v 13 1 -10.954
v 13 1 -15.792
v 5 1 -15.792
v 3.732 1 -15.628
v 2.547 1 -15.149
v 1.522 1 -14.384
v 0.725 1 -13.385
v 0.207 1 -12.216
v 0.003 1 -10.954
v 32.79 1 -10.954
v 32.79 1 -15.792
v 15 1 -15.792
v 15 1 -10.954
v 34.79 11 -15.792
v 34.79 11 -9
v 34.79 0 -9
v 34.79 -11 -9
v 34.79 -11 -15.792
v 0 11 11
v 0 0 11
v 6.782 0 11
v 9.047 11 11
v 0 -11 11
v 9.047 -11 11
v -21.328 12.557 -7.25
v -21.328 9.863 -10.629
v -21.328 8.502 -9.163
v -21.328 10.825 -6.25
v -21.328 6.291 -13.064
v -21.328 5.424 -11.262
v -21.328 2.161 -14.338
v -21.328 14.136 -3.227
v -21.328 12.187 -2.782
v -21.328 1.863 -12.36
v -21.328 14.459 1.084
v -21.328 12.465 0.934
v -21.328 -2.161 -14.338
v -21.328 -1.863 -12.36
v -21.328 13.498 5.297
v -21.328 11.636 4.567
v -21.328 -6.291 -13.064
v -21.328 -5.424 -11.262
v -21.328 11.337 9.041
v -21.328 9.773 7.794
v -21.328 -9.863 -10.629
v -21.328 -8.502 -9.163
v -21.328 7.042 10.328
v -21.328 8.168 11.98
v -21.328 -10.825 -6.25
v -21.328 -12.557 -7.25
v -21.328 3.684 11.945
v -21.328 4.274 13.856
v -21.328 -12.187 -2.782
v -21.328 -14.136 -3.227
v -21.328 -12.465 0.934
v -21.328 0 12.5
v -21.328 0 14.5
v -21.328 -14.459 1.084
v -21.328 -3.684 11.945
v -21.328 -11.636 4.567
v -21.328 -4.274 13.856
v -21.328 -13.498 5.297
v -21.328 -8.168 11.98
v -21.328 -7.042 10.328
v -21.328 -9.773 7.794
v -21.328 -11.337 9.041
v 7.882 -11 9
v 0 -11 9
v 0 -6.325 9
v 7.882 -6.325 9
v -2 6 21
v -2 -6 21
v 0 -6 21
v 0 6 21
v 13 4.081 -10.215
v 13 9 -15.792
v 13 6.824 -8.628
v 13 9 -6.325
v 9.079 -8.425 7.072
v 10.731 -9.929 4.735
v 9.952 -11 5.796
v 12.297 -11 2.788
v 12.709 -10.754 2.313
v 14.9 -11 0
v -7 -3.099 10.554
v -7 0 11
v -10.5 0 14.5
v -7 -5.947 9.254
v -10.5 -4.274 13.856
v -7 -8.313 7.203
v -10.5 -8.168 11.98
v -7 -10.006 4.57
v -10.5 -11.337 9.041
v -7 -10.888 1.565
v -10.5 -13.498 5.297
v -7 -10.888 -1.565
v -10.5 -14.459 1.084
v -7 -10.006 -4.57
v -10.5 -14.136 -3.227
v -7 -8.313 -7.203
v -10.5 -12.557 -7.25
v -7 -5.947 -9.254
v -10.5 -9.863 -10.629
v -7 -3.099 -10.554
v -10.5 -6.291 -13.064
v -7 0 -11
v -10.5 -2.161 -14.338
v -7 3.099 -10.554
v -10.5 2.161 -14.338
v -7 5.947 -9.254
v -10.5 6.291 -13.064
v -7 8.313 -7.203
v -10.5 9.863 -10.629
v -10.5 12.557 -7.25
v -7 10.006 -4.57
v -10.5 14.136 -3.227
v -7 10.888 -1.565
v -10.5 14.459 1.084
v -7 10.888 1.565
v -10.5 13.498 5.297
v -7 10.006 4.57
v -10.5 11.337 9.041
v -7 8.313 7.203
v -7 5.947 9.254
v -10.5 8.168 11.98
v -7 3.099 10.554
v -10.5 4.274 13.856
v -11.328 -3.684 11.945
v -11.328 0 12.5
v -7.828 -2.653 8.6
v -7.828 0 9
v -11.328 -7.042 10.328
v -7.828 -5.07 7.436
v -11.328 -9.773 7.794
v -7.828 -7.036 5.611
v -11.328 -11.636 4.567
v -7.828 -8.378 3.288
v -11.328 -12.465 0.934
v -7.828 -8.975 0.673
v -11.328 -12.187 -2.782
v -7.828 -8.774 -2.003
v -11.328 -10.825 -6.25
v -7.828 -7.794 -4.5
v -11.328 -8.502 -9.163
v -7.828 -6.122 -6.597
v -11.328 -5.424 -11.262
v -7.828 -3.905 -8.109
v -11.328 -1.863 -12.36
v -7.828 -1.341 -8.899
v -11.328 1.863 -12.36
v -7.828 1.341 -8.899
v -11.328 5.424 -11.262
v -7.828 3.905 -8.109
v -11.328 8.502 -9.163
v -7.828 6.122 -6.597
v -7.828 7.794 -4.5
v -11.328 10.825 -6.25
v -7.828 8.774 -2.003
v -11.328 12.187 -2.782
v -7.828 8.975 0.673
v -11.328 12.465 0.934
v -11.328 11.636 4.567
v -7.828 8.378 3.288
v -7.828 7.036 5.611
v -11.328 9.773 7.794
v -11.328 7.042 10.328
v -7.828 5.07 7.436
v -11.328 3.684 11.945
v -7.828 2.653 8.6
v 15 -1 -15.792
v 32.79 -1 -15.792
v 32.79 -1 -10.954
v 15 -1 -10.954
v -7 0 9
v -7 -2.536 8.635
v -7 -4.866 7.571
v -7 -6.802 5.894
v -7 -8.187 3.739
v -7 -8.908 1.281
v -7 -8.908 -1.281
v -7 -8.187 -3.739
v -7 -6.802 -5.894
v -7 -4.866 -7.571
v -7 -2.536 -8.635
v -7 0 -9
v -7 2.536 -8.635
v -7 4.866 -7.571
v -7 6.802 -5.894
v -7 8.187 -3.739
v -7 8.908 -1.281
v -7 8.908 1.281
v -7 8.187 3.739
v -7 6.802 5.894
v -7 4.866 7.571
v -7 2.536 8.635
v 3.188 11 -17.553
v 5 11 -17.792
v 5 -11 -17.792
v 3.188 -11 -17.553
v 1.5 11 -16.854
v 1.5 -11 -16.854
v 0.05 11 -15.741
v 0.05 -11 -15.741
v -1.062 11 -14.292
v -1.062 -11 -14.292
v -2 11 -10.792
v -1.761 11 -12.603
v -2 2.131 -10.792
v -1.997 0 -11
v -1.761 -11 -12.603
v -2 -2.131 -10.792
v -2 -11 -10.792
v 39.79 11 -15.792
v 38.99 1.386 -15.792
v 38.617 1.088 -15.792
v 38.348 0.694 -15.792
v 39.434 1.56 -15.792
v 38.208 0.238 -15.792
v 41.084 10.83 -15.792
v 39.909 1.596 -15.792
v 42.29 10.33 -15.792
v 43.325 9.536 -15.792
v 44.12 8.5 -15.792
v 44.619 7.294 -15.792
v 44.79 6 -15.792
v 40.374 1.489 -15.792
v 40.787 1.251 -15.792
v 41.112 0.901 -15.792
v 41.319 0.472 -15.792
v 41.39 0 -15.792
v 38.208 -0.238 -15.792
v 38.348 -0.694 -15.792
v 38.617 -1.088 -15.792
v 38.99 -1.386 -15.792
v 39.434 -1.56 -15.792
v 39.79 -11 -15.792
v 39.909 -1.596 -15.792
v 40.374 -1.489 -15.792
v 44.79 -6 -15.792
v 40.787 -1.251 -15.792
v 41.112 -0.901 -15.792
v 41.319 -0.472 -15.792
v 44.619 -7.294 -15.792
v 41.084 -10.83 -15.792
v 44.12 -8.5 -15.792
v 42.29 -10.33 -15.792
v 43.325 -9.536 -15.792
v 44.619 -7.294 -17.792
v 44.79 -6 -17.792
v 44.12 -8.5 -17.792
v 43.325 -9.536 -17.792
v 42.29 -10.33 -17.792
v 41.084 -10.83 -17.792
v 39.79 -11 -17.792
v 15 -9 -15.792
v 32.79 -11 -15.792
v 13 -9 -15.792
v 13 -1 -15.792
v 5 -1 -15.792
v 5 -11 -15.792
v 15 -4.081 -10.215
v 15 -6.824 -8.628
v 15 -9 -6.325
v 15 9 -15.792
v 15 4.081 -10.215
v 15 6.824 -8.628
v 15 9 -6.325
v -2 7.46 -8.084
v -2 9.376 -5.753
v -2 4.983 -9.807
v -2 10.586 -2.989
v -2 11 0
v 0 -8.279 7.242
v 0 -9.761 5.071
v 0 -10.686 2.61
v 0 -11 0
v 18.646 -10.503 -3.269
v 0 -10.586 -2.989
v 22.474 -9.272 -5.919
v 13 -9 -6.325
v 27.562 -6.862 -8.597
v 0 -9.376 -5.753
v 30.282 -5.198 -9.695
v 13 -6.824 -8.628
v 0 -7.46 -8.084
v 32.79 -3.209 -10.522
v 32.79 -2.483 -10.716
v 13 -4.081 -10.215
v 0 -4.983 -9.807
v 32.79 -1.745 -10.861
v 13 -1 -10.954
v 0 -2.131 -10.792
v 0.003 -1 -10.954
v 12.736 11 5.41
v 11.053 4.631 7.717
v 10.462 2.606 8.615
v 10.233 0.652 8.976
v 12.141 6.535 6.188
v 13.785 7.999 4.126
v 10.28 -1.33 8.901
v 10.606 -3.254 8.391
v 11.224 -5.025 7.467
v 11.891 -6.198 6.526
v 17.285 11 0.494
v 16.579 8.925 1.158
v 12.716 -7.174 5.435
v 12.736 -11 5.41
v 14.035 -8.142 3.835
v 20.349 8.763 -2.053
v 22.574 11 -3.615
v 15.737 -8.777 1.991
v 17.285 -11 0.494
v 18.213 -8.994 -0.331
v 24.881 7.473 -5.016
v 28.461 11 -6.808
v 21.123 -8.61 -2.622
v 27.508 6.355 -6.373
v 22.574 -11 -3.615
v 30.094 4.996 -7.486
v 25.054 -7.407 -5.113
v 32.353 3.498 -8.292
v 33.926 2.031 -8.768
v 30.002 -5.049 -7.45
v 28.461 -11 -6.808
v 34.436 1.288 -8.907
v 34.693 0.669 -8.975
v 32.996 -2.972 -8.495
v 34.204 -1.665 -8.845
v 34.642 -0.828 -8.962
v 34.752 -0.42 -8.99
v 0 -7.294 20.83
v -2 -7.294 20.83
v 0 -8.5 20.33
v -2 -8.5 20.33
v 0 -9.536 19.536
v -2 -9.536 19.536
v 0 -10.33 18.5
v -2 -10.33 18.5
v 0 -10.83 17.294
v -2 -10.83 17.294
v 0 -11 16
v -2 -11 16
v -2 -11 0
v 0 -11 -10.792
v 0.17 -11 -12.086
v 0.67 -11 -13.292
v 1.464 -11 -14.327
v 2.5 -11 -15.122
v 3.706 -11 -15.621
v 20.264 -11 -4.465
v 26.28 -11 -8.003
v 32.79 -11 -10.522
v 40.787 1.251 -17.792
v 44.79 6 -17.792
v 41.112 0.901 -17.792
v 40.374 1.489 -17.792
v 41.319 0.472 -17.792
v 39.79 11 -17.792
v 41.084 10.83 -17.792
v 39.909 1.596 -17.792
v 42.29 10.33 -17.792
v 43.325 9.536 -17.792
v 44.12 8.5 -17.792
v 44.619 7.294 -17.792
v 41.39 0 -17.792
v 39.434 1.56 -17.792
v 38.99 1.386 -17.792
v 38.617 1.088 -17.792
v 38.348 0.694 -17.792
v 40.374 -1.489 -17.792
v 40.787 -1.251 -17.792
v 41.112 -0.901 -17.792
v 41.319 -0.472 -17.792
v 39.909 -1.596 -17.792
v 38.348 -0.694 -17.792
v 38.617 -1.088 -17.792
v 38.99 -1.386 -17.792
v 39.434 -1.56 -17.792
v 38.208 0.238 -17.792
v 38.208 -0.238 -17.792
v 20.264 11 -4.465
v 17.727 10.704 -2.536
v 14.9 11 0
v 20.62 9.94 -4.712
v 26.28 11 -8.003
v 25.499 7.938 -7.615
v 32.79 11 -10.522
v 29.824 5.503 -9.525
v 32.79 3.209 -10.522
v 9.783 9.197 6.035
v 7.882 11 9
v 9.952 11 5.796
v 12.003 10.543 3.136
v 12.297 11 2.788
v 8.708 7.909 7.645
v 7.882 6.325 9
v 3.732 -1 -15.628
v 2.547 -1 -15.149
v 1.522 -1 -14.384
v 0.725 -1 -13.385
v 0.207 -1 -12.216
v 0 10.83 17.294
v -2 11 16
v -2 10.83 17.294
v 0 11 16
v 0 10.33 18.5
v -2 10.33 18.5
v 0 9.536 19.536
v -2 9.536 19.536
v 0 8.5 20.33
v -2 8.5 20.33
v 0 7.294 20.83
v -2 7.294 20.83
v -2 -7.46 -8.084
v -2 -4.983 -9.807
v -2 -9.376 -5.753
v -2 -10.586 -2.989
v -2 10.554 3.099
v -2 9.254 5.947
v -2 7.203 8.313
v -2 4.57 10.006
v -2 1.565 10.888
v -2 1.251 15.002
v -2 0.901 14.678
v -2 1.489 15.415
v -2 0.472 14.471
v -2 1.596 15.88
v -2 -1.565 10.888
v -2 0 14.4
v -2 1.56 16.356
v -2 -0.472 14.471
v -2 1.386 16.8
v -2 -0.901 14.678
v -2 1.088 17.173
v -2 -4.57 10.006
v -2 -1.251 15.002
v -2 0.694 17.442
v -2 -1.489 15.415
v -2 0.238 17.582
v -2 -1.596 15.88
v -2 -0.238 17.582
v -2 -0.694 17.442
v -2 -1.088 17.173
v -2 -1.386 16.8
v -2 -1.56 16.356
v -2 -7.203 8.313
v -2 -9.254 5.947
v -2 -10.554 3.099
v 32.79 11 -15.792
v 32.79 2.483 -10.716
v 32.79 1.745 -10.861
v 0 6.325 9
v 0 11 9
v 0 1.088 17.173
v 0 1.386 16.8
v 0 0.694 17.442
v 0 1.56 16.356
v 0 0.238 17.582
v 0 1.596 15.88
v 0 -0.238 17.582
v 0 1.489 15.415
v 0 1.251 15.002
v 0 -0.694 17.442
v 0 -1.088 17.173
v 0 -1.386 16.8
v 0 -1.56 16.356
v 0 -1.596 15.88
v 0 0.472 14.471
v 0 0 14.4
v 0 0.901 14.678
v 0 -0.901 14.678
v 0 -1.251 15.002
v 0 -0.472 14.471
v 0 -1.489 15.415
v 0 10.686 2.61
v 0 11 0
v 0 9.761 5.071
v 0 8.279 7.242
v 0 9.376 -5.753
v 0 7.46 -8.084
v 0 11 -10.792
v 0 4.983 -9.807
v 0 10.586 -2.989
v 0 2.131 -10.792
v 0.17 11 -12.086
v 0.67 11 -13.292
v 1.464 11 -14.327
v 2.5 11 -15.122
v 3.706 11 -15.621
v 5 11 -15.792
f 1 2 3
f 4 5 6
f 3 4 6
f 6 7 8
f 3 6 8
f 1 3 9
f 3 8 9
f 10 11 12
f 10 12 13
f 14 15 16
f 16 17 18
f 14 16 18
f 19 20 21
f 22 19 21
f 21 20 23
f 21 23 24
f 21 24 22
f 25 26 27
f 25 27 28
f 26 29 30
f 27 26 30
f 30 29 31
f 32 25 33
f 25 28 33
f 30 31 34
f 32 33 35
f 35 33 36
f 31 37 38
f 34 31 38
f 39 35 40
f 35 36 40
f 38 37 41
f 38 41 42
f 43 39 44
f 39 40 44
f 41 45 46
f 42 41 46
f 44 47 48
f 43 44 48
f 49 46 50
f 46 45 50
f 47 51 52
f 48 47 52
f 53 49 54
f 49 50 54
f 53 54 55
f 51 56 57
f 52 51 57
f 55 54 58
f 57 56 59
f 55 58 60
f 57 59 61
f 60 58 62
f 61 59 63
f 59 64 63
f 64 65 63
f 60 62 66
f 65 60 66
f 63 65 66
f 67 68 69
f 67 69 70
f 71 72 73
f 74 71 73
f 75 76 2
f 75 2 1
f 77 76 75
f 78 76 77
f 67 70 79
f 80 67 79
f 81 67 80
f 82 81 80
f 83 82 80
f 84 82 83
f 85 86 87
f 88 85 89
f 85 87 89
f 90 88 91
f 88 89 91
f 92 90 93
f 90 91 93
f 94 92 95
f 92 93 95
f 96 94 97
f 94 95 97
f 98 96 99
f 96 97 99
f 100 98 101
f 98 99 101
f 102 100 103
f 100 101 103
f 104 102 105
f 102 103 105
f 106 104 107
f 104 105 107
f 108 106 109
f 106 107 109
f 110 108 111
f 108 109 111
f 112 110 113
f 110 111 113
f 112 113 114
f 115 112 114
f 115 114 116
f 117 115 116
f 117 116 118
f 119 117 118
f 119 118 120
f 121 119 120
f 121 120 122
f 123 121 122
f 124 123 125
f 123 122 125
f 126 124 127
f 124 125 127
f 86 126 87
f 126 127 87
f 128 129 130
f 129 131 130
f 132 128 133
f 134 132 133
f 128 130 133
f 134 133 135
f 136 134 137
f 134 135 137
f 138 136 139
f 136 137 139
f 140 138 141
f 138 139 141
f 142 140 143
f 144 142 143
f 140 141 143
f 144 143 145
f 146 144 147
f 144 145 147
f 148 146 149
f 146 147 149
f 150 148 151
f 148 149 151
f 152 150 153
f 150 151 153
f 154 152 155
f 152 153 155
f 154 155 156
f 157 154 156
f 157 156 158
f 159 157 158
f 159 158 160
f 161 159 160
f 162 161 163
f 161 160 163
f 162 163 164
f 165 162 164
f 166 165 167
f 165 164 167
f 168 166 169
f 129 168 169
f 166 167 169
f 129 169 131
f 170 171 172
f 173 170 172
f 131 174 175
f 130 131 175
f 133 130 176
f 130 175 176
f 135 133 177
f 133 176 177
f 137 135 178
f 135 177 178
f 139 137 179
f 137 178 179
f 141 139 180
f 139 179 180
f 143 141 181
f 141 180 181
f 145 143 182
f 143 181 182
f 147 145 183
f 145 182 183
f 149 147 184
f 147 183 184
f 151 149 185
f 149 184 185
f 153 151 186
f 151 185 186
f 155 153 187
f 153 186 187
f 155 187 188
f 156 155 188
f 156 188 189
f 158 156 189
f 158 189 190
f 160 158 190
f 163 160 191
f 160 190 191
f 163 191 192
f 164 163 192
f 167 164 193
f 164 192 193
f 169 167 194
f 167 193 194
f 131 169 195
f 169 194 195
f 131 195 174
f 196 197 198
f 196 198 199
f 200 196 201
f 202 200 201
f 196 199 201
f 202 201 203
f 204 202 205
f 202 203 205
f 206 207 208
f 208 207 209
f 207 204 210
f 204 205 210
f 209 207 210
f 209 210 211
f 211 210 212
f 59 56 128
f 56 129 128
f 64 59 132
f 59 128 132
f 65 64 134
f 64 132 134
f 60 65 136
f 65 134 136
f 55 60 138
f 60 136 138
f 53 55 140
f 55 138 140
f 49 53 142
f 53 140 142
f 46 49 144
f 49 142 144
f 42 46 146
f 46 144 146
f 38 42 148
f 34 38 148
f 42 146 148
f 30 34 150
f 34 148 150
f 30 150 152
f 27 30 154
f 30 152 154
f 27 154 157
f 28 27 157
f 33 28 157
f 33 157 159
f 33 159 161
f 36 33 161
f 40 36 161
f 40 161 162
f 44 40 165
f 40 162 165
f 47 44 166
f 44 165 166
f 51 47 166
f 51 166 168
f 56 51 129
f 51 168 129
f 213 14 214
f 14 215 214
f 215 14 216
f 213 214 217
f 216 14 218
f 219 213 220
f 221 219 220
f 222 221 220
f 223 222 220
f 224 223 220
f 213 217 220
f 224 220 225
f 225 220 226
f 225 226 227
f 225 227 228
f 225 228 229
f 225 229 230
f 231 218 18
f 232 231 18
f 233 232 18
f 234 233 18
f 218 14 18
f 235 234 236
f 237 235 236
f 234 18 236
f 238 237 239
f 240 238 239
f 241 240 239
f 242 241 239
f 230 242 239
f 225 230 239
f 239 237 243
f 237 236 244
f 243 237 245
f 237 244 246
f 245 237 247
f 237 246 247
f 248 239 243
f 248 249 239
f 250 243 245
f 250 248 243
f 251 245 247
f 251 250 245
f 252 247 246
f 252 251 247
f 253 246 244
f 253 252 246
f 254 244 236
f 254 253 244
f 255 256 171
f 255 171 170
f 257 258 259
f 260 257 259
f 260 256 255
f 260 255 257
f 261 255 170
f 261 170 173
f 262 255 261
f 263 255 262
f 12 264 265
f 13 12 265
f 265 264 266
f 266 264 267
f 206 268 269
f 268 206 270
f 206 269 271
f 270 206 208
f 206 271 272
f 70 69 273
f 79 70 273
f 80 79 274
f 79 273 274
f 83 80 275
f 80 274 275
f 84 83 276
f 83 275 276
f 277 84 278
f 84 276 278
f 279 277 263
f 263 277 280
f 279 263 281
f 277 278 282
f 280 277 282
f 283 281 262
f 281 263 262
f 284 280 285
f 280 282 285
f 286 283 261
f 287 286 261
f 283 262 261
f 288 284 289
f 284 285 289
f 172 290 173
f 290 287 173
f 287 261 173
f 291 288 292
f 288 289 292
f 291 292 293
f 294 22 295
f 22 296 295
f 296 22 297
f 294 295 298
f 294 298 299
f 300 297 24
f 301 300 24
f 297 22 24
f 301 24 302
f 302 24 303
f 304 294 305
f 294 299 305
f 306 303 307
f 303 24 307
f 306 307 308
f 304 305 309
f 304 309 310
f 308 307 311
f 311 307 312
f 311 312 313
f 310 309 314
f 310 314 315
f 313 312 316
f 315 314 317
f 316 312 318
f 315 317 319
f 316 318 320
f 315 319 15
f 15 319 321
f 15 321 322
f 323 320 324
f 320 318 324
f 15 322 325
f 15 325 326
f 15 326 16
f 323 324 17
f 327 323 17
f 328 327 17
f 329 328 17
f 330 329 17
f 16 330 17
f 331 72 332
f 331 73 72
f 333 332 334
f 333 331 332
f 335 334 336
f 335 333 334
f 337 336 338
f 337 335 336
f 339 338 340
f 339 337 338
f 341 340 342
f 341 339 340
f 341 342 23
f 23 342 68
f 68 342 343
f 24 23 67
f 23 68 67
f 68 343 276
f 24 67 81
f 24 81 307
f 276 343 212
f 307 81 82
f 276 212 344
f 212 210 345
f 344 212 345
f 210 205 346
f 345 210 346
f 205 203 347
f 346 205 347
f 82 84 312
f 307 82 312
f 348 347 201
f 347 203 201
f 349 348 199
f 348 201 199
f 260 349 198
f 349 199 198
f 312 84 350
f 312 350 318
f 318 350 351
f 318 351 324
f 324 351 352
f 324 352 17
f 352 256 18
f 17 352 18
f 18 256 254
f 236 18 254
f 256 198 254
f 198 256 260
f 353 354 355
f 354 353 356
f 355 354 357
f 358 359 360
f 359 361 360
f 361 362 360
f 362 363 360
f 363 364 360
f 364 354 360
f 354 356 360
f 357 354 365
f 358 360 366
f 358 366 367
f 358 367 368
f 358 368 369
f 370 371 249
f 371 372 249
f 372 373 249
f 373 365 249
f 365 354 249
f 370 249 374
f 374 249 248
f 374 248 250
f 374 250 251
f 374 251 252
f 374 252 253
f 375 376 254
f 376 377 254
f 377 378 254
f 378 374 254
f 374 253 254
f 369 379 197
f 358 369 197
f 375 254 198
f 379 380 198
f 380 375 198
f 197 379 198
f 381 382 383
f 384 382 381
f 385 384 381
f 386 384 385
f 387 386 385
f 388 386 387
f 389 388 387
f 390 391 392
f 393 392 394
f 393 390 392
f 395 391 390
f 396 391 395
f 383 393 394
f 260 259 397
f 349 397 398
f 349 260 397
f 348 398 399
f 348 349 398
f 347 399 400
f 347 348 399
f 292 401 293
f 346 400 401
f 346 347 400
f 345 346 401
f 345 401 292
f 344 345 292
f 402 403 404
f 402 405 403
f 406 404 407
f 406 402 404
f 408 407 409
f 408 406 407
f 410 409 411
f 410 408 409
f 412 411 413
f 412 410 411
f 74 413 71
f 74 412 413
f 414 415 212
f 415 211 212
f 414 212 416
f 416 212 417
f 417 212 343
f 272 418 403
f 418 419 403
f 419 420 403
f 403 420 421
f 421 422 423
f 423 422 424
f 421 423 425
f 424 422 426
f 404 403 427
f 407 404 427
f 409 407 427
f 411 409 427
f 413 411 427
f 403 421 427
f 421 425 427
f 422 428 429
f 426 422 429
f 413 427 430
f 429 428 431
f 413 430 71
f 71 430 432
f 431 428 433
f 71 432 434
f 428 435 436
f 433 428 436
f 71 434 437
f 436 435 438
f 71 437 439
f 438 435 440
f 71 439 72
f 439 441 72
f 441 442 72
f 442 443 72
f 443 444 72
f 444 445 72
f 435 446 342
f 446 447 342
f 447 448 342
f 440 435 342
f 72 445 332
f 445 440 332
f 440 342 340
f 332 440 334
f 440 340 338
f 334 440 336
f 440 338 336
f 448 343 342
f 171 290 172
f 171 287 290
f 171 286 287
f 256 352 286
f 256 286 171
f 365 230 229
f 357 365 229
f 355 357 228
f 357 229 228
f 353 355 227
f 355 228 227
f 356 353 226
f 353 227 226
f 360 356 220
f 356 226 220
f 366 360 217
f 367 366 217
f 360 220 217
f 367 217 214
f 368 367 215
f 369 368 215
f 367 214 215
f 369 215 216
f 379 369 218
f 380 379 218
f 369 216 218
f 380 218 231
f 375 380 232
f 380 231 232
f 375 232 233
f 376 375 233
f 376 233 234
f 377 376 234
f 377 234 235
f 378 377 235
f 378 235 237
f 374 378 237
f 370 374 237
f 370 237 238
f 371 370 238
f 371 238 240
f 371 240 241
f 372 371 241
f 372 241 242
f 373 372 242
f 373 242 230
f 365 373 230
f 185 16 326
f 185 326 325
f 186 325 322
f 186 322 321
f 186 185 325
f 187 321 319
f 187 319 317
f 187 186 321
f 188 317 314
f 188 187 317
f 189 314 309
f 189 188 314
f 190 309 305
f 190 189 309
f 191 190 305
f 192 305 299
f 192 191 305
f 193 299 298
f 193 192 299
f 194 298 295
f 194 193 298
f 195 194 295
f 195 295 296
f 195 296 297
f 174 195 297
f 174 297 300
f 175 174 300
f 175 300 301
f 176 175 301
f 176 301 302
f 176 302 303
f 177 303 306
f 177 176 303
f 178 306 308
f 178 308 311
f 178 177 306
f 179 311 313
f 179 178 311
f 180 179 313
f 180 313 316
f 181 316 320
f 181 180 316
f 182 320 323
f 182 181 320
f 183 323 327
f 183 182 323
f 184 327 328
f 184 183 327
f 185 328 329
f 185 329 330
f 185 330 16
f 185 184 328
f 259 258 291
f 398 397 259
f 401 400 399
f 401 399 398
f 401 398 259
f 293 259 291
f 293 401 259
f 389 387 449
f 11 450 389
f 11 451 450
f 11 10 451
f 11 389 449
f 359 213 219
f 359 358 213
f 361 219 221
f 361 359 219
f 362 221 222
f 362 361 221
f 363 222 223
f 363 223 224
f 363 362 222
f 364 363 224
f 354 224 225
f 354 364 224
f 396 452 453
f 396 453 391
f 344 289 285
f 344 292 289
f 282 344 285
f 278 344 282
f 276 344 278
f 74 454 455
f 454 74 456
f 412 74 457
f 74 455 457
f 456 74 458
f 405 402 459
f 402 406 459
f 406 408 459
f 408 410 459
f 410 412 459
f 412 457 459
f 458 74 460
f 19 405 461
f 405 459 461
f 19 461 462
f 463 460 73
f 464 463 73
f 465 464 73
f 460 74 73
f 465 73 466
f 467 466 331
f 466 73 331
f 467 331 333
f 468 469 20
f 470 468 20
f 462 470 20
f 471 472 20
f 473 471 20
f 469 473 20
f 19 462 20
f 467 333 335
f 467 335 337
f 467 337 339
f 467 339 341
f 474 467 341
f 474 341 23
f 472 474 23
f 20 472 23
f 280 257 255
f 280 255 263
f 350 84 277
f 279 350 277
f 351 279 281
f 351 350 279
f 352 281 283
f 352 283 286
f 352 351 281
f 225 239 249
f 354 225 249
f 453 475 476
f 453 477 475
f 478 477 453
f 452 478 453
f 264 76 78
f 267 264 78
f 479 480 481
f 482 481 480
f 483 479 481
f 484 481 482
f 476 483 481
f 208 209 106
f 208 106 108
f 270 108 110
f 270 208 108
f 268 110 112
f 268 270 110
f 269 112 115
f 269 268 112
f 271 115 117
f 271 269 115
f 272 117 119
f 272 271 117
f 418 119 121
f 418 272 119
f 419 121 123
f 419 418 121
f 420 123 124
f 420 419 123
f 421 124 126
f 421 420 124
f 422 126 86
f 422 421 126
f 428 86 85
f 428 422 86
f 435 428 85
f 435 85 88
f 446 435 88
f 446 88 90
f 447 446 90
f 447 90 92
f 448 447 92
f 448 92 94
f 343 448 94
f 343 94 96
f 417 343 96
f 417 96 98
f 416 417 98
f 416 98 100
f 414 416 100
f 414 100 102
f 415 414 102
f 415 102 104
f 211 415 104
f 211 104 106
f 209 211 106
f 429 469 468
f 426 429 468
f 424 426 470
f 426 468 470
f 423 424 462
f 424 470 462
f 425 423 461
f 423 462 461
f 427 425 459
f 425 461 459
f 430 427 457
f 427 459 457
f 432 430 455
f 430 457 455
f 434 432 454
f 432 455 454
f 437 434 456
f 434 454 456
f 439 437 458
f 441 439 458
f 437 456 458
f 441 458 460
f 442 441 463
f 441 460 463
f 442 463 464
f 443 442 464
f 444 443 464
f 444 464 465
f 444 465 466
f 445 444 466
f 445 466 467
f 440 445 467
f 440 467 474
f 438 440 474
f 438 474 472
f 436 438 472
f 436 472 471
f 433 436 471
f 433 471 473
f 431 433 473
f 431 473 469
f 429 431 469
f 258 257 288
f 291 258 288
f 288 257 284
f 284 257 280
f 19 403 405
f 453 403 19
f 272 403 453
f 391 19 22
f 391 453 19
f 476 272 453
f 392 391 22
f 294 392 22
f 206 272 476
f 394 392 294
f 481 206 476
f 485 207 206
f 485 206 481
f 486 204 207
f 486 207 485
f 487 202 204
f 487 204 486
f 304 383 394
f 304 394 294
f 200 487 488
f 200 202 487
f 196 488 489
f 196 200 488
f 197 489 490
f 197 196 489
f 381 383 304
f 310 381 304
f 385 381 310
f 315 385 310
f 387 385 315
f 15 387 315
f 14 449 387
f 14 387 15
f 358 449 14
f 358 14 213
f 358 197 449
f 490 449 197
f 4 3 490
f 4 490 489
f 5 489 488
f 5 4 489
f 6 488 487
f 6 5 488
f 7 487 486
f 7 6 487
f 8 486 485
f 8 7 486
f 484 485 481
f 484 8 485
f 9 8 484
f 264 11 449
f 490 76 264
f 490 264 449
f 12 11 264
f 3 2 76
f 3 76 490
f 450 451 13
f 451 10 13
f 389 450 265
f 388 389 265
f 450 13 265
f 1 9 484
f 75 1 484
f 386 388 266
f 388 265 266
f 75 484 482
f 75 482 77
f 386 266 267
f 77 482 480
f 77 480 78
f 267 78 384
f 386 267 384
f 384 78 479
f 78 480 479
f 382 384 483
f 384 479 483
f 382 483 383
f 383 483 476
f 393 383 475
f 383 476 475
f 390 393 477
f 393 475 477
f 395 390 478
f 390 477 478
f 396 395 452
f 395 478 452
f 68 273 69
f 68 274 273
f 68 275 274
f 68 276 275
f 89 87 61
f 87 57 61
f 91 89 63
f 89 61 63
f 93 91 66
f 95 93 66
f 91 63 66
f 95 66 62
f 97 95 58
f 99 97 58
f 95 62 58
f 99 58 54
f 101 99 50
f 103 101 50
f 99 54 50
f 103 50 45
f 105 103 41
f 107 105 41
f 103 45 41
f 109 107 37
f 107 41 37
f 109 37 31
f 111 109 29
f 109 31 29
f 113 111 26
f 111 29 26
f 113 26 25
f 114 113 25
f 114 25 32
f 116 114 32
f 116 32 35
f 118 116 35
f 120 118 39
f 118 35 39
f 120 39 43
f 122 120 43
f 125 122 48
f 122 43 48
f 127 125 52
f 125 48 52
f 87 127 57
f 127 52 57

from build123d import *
from build123d.topology import SkipClean

# Parameters (mm, degrees)
EXTRUDE_1_DEPTH                 = 11
EXTRUDE_1_DEPTH_BACK            = 11
EXTRUDE_6_REACH                 = 52.677
EXTRUDE_6_END_RADIUS            = 43
SKETCH_4_R                      = 11
EXTRUDE_6_DIRECTION_2_DEPTH     = 7
RIB_11_REACH                    = 52.677
SKETCH_7_WALL_W                 = 108.144859428
SKETCH_7_WALL_H                 = 2
RIB_12_REACH                    = 52.677
SKETCH_7_2_WALL_W               = 108.144859428
SKETCH_7_2_WALL_H               = 2
RIB_14_REACH                    = 40.859
SKETCH_8_WALL_W                 = 89.184699428
SKETCH_8_WALL_H                 = 2
CUT_EXTRUDE_1_REACH             = 52.677
CUT_EXTRUDE_1_END_RADIUS        = 41
SKETCH_9_R                      = 9
CUT_EXTRUDE_1_DIRECTION_2_DEPTH = 7
CUT_EXTRUDE_2_REACH             = 52.677
SKETCH_10_R                     = 1.6
CUT_EXTRUDE_3_REACH             = 60.998
SKETCH_11_R                     = 1.6
FILLET_1_R                      = 5


with BuildPart() as part:
    # 草图2 → 凸台-拉伸1 (new, two sides: drawn at the far end of the back side and taken through both)
    with BuildSketch(Plane(origin=(0, 0, 0), x_dir=(1, 0, 0), z_dir=(0, 1, 0)).offset(-EXTRUDE_1_DEPTH_BACK)):
        with BuildLine():
            Line((-2, 10.791694934), (-2, -21))
            Line((-2, -21), (0, -21))
            Line((0, -21), (0, -11))
            Line((0, -11), (9.04749367, -11))
            ThreePointArc((9.04749367, -11), (19.845447894, 1.668361044), (34.789686155, 9))
            Line((34.789686155, 9), (34.789686155, 15.791694934))
            Line((34.789686155, 15.791694934), (44.789686155, 15.791694934))
            Line((44.789686155, 15.791694934), (44.789686155, 17.791694934))
            Line((44.789686155, 17.791694934), (5, 17.791694934))
            ThreePointArc((5, 17.791694934), (0.050252532, 15.741442403), (-2, 10.791694934))
        make_face()
        with BuildLine():
            Line((0, 10.791694934), (0, -9))
            Line((0, -9), (7.881951948, -9))
            ThreePointArc((7.881951948, -9), (18.474626995, 3.135521358), (32.789686155, 10.521638371))
            Line((32.789686155, 10.521638371), (32.789686155, 15.791694934))
            Line((32.789686155, 15.791694934), (5, 15.791694934))
            ThreePointArc((5, 15.791694934), (1.464466094, 14.32722884), (0, 10.791694934))
        make_face(mode=Mode.SUBTRACT)
    extrude(amount=EXTRUDE_1_DEPTH + EXTRUDE_1_DEPTH_BACK)

    # 凸台-拉伸6: up to this cylinder (the profile starts outside it)
    extrude_6_end = Plane(origin=(45, 0, 30.708305066), z_dir=(0, 1, 0)) * Cylinder(EXTRUDE_6_END_RADIUS, 192.354, mode=Mode.PRIVATE)
    # 草图4 → 凸台-拉伸6 (add, up to the surface)
    with BuildSketch(Plane(origin=(0, 0, 0), x_dir=(0, 0, -1), z_dir=(1, 0, 0)), mode=Mode.PRIVATE) as extrude_6_sk1:
        Circle(SKETCH_4_R)
    extrude_6_tool1 = extrude(extrude_6_sk1.sketch, amount=EXTRUDE_6_REACH, mode=Mode.PRIVATE) - extrude_6_end
    add(extrude_6_tool1.solids().sort_by_distance((0, 0, 0))[0])

    # 草图4 → 凸台-拉伸6 direction 2 (add)
    with BuildSketch(Plane(origin=(0, 0, 0), x_dir=(0, 0, -1), z_dir=(1, 0, 0))):
        Circle(SKETCH_4_R)
    extrude(amount=-EXTRUDE_6_DIRECTION_2_DEPTH)

    # 草图7 wall → 筋11 (add, up to next)
    with BuildSketch(Plane(origin=(18.894843077, 0, -13.395847467), x_dir=(0, 0, 1), z_dir=(1, 0, 0)), mode=Mode.PRIVATE) as rib_11_sk1:
        Rectangle(SKETCH_7_WALL_W, SKETCH_7_WALL_H)
    rib_11_tool1 = extrude(rib_11_sk1.sketch, amount=-RIB_11_REACH, mode=Mode.PRIVATE) - part.part
    add(rib_11_tool1.solids().sort_by_distance((18.894843077, 0, -13.395847467))[0])

    # 草图7<2> wall → 筋12 (add, up to next)
    with BuildSketch(Plane(origin=(18.894843077, 0, -13.395847467), x_dir=(0, 0, 1), z_dir=(1, 0, 0)), mode=Mode.PRIVATE) as rib_12_sk1:
        Rectangle(SKETCH_7_2_WALL_W, SKETCH_7_2_WALL_H)
    rib_12_tool1 = extrude(rib_12_sk1.sketch, amount=RIB_12_REACH, mode=Mode.PRIVATE) - part.part
    add(rib_12_tool1.solids().sort_by_distance((18.894843077, 0, -13.395847467))[0])

    # 草图8 wall → 筋14 (add, up to next)
    with BuildSketch(Plane(origin=(14, 9, -11.058125127), x_dir=(0, 0, 1), z_dir=(0, -1, 0)), mode=Mode.PRIVATE) as rib_14_sk1:
        Rectangle(SKETCH_8_WALL_W, SKETCH_8_WALL_H)
    rib_14_tool1 = extrude(rib_14_sk1.sketch, amount=RIB_14_REACH, mode=Mode.PRIVATE) - part.part
    rib_14 = rib_14_tool1.solids().sort_by_distance((14, 9, -11.058125127))[0]
    add(rib_14)

    # 镜向1: 筋14 across plane
    add(rib_14.mirror(Plane.ZX))

    # 切除-拉伸1: up to this cylinder (the profile starts outside it)
    cut_extrude_1_end = Plane(origin=(45, 0, 30.708305066), z_dir=(0, 1, 0)) * Cylinder(CUT_EXTRUDE_1_END_RADIUS, 188.354, mode=Mode.PRIVATE)
    # 草图9 → 切除-拉伸1 (cut, up to the surface)
    with BuildSketch(Plane(origin=(0, 0, 0), x_dir=(0, 0, -1), z_dir=(1, 0, 0)), mode=Mode.PRIVATE) as cut_extrude_1_sk1:
        Circle(SKETCH_9_R)
    cut_extrude_1_tool1 = extrude(cut_extrude_1_sk1.sketch, amount=CUT_EXTRUDE_1_REACH, mode=Mode.PRIVATE) - cut_extrude_1_end
    add(cut_extrude_1_tool1.solids().sort_by_distance((0, 0, 0))[0], mode=Mode.SUBTRACT)

    # 草图9 → 切除-拉伸1 direction 2 (cut)
    with BuildSketch(Plane(origin=(0, 0, 0), x_dir=(0, 0, -1), z_dir=(1, 0, 0))):
        Circle(SKETCH_9_R)
    extrude(amount=-CUT_EXTRUDE_1_DIRECTION_2_DEPTH, mode=Mode.SUBTRACT)

    # 草图10 → 切除-拉伸2 (cut, up to next)
    with BuildSketch(Plane(origin=(0, 0, 0), x_dir=(0, 0, -1), z_dir=(1, 0, 0)), mode=Mode.PRIVATE) as cut_extrude_2_sk1:
        with Locations((-16, 0)):
            Circle(SKETCH_10_R)
    cut_extrude_2_tool1 = extrude(cut_extrude_2_sk1.sketch, amount=-CUT_EXTRUDE_2_REACH, mode=Mode.PRIVATE) & part.part
    add(cut_extrude_2_tool1.solids().sort_by_distance((0, 0, 16))[0], mode=Mode.SUBTRACT)

    # 草图11 → 切除-拉伸3 (cut, up to next)
    with BuildSketch(Plane.XY.offset(-15.791694934), mode=Mode.PRIVATE) as cut_extrude_3_sk1:
        with Locations((39.789686155, 0)):
            Circle(SKETCH_11_R)
    cut_extrude_3_tool1 = extrude(cut_extrude_3_sk1.sketch, amount=-CUT_EXTRUDE_3_REACH, mode=Mode.PRIVATE) & part.part
    add(cut_extrude_3_tool1.solids().sort_by_distance((39.789686, 0, -15.791695))[0], mode=Mode.SUBTRACT)

    # 圆角1
    fillet_1_edges = [part.edges().sort_by_distance(p)[0] for p in [
        (44.789686155, -11, -16.791694934),
        (-1, -11, 21),
        (-1, 11, 21),
        (44.789686155, 11, -16.791694934),
    ]]
    fillet(fillet_1_edges, radius=FILLET_1_R)

    # 草图14 → 旋转1 (revolve)
    with SkipClean():  # the faces are left unmerged after this step: merging them gives an invalid solid
        with BuildSketch(Plane.XY, mode=Mode.PRIVATE) as revolve_1_sk:
            Polygon((-10.5, 14.5), (-21.328427125, 14.5), (-21.328427125, 12.5), (-11.328427125, 12.5), (-7.828427125, 9), (-7, 9), (-7, 11), align=None)
        revolve(revolve_1_sk.sketch.rotate(Axis((-18.782404652, 0, 0), (1, 0, 0)), 90), axis=Axis((-18.782404652, 0, 0), (1, 0, 0)))


solid = part.part
